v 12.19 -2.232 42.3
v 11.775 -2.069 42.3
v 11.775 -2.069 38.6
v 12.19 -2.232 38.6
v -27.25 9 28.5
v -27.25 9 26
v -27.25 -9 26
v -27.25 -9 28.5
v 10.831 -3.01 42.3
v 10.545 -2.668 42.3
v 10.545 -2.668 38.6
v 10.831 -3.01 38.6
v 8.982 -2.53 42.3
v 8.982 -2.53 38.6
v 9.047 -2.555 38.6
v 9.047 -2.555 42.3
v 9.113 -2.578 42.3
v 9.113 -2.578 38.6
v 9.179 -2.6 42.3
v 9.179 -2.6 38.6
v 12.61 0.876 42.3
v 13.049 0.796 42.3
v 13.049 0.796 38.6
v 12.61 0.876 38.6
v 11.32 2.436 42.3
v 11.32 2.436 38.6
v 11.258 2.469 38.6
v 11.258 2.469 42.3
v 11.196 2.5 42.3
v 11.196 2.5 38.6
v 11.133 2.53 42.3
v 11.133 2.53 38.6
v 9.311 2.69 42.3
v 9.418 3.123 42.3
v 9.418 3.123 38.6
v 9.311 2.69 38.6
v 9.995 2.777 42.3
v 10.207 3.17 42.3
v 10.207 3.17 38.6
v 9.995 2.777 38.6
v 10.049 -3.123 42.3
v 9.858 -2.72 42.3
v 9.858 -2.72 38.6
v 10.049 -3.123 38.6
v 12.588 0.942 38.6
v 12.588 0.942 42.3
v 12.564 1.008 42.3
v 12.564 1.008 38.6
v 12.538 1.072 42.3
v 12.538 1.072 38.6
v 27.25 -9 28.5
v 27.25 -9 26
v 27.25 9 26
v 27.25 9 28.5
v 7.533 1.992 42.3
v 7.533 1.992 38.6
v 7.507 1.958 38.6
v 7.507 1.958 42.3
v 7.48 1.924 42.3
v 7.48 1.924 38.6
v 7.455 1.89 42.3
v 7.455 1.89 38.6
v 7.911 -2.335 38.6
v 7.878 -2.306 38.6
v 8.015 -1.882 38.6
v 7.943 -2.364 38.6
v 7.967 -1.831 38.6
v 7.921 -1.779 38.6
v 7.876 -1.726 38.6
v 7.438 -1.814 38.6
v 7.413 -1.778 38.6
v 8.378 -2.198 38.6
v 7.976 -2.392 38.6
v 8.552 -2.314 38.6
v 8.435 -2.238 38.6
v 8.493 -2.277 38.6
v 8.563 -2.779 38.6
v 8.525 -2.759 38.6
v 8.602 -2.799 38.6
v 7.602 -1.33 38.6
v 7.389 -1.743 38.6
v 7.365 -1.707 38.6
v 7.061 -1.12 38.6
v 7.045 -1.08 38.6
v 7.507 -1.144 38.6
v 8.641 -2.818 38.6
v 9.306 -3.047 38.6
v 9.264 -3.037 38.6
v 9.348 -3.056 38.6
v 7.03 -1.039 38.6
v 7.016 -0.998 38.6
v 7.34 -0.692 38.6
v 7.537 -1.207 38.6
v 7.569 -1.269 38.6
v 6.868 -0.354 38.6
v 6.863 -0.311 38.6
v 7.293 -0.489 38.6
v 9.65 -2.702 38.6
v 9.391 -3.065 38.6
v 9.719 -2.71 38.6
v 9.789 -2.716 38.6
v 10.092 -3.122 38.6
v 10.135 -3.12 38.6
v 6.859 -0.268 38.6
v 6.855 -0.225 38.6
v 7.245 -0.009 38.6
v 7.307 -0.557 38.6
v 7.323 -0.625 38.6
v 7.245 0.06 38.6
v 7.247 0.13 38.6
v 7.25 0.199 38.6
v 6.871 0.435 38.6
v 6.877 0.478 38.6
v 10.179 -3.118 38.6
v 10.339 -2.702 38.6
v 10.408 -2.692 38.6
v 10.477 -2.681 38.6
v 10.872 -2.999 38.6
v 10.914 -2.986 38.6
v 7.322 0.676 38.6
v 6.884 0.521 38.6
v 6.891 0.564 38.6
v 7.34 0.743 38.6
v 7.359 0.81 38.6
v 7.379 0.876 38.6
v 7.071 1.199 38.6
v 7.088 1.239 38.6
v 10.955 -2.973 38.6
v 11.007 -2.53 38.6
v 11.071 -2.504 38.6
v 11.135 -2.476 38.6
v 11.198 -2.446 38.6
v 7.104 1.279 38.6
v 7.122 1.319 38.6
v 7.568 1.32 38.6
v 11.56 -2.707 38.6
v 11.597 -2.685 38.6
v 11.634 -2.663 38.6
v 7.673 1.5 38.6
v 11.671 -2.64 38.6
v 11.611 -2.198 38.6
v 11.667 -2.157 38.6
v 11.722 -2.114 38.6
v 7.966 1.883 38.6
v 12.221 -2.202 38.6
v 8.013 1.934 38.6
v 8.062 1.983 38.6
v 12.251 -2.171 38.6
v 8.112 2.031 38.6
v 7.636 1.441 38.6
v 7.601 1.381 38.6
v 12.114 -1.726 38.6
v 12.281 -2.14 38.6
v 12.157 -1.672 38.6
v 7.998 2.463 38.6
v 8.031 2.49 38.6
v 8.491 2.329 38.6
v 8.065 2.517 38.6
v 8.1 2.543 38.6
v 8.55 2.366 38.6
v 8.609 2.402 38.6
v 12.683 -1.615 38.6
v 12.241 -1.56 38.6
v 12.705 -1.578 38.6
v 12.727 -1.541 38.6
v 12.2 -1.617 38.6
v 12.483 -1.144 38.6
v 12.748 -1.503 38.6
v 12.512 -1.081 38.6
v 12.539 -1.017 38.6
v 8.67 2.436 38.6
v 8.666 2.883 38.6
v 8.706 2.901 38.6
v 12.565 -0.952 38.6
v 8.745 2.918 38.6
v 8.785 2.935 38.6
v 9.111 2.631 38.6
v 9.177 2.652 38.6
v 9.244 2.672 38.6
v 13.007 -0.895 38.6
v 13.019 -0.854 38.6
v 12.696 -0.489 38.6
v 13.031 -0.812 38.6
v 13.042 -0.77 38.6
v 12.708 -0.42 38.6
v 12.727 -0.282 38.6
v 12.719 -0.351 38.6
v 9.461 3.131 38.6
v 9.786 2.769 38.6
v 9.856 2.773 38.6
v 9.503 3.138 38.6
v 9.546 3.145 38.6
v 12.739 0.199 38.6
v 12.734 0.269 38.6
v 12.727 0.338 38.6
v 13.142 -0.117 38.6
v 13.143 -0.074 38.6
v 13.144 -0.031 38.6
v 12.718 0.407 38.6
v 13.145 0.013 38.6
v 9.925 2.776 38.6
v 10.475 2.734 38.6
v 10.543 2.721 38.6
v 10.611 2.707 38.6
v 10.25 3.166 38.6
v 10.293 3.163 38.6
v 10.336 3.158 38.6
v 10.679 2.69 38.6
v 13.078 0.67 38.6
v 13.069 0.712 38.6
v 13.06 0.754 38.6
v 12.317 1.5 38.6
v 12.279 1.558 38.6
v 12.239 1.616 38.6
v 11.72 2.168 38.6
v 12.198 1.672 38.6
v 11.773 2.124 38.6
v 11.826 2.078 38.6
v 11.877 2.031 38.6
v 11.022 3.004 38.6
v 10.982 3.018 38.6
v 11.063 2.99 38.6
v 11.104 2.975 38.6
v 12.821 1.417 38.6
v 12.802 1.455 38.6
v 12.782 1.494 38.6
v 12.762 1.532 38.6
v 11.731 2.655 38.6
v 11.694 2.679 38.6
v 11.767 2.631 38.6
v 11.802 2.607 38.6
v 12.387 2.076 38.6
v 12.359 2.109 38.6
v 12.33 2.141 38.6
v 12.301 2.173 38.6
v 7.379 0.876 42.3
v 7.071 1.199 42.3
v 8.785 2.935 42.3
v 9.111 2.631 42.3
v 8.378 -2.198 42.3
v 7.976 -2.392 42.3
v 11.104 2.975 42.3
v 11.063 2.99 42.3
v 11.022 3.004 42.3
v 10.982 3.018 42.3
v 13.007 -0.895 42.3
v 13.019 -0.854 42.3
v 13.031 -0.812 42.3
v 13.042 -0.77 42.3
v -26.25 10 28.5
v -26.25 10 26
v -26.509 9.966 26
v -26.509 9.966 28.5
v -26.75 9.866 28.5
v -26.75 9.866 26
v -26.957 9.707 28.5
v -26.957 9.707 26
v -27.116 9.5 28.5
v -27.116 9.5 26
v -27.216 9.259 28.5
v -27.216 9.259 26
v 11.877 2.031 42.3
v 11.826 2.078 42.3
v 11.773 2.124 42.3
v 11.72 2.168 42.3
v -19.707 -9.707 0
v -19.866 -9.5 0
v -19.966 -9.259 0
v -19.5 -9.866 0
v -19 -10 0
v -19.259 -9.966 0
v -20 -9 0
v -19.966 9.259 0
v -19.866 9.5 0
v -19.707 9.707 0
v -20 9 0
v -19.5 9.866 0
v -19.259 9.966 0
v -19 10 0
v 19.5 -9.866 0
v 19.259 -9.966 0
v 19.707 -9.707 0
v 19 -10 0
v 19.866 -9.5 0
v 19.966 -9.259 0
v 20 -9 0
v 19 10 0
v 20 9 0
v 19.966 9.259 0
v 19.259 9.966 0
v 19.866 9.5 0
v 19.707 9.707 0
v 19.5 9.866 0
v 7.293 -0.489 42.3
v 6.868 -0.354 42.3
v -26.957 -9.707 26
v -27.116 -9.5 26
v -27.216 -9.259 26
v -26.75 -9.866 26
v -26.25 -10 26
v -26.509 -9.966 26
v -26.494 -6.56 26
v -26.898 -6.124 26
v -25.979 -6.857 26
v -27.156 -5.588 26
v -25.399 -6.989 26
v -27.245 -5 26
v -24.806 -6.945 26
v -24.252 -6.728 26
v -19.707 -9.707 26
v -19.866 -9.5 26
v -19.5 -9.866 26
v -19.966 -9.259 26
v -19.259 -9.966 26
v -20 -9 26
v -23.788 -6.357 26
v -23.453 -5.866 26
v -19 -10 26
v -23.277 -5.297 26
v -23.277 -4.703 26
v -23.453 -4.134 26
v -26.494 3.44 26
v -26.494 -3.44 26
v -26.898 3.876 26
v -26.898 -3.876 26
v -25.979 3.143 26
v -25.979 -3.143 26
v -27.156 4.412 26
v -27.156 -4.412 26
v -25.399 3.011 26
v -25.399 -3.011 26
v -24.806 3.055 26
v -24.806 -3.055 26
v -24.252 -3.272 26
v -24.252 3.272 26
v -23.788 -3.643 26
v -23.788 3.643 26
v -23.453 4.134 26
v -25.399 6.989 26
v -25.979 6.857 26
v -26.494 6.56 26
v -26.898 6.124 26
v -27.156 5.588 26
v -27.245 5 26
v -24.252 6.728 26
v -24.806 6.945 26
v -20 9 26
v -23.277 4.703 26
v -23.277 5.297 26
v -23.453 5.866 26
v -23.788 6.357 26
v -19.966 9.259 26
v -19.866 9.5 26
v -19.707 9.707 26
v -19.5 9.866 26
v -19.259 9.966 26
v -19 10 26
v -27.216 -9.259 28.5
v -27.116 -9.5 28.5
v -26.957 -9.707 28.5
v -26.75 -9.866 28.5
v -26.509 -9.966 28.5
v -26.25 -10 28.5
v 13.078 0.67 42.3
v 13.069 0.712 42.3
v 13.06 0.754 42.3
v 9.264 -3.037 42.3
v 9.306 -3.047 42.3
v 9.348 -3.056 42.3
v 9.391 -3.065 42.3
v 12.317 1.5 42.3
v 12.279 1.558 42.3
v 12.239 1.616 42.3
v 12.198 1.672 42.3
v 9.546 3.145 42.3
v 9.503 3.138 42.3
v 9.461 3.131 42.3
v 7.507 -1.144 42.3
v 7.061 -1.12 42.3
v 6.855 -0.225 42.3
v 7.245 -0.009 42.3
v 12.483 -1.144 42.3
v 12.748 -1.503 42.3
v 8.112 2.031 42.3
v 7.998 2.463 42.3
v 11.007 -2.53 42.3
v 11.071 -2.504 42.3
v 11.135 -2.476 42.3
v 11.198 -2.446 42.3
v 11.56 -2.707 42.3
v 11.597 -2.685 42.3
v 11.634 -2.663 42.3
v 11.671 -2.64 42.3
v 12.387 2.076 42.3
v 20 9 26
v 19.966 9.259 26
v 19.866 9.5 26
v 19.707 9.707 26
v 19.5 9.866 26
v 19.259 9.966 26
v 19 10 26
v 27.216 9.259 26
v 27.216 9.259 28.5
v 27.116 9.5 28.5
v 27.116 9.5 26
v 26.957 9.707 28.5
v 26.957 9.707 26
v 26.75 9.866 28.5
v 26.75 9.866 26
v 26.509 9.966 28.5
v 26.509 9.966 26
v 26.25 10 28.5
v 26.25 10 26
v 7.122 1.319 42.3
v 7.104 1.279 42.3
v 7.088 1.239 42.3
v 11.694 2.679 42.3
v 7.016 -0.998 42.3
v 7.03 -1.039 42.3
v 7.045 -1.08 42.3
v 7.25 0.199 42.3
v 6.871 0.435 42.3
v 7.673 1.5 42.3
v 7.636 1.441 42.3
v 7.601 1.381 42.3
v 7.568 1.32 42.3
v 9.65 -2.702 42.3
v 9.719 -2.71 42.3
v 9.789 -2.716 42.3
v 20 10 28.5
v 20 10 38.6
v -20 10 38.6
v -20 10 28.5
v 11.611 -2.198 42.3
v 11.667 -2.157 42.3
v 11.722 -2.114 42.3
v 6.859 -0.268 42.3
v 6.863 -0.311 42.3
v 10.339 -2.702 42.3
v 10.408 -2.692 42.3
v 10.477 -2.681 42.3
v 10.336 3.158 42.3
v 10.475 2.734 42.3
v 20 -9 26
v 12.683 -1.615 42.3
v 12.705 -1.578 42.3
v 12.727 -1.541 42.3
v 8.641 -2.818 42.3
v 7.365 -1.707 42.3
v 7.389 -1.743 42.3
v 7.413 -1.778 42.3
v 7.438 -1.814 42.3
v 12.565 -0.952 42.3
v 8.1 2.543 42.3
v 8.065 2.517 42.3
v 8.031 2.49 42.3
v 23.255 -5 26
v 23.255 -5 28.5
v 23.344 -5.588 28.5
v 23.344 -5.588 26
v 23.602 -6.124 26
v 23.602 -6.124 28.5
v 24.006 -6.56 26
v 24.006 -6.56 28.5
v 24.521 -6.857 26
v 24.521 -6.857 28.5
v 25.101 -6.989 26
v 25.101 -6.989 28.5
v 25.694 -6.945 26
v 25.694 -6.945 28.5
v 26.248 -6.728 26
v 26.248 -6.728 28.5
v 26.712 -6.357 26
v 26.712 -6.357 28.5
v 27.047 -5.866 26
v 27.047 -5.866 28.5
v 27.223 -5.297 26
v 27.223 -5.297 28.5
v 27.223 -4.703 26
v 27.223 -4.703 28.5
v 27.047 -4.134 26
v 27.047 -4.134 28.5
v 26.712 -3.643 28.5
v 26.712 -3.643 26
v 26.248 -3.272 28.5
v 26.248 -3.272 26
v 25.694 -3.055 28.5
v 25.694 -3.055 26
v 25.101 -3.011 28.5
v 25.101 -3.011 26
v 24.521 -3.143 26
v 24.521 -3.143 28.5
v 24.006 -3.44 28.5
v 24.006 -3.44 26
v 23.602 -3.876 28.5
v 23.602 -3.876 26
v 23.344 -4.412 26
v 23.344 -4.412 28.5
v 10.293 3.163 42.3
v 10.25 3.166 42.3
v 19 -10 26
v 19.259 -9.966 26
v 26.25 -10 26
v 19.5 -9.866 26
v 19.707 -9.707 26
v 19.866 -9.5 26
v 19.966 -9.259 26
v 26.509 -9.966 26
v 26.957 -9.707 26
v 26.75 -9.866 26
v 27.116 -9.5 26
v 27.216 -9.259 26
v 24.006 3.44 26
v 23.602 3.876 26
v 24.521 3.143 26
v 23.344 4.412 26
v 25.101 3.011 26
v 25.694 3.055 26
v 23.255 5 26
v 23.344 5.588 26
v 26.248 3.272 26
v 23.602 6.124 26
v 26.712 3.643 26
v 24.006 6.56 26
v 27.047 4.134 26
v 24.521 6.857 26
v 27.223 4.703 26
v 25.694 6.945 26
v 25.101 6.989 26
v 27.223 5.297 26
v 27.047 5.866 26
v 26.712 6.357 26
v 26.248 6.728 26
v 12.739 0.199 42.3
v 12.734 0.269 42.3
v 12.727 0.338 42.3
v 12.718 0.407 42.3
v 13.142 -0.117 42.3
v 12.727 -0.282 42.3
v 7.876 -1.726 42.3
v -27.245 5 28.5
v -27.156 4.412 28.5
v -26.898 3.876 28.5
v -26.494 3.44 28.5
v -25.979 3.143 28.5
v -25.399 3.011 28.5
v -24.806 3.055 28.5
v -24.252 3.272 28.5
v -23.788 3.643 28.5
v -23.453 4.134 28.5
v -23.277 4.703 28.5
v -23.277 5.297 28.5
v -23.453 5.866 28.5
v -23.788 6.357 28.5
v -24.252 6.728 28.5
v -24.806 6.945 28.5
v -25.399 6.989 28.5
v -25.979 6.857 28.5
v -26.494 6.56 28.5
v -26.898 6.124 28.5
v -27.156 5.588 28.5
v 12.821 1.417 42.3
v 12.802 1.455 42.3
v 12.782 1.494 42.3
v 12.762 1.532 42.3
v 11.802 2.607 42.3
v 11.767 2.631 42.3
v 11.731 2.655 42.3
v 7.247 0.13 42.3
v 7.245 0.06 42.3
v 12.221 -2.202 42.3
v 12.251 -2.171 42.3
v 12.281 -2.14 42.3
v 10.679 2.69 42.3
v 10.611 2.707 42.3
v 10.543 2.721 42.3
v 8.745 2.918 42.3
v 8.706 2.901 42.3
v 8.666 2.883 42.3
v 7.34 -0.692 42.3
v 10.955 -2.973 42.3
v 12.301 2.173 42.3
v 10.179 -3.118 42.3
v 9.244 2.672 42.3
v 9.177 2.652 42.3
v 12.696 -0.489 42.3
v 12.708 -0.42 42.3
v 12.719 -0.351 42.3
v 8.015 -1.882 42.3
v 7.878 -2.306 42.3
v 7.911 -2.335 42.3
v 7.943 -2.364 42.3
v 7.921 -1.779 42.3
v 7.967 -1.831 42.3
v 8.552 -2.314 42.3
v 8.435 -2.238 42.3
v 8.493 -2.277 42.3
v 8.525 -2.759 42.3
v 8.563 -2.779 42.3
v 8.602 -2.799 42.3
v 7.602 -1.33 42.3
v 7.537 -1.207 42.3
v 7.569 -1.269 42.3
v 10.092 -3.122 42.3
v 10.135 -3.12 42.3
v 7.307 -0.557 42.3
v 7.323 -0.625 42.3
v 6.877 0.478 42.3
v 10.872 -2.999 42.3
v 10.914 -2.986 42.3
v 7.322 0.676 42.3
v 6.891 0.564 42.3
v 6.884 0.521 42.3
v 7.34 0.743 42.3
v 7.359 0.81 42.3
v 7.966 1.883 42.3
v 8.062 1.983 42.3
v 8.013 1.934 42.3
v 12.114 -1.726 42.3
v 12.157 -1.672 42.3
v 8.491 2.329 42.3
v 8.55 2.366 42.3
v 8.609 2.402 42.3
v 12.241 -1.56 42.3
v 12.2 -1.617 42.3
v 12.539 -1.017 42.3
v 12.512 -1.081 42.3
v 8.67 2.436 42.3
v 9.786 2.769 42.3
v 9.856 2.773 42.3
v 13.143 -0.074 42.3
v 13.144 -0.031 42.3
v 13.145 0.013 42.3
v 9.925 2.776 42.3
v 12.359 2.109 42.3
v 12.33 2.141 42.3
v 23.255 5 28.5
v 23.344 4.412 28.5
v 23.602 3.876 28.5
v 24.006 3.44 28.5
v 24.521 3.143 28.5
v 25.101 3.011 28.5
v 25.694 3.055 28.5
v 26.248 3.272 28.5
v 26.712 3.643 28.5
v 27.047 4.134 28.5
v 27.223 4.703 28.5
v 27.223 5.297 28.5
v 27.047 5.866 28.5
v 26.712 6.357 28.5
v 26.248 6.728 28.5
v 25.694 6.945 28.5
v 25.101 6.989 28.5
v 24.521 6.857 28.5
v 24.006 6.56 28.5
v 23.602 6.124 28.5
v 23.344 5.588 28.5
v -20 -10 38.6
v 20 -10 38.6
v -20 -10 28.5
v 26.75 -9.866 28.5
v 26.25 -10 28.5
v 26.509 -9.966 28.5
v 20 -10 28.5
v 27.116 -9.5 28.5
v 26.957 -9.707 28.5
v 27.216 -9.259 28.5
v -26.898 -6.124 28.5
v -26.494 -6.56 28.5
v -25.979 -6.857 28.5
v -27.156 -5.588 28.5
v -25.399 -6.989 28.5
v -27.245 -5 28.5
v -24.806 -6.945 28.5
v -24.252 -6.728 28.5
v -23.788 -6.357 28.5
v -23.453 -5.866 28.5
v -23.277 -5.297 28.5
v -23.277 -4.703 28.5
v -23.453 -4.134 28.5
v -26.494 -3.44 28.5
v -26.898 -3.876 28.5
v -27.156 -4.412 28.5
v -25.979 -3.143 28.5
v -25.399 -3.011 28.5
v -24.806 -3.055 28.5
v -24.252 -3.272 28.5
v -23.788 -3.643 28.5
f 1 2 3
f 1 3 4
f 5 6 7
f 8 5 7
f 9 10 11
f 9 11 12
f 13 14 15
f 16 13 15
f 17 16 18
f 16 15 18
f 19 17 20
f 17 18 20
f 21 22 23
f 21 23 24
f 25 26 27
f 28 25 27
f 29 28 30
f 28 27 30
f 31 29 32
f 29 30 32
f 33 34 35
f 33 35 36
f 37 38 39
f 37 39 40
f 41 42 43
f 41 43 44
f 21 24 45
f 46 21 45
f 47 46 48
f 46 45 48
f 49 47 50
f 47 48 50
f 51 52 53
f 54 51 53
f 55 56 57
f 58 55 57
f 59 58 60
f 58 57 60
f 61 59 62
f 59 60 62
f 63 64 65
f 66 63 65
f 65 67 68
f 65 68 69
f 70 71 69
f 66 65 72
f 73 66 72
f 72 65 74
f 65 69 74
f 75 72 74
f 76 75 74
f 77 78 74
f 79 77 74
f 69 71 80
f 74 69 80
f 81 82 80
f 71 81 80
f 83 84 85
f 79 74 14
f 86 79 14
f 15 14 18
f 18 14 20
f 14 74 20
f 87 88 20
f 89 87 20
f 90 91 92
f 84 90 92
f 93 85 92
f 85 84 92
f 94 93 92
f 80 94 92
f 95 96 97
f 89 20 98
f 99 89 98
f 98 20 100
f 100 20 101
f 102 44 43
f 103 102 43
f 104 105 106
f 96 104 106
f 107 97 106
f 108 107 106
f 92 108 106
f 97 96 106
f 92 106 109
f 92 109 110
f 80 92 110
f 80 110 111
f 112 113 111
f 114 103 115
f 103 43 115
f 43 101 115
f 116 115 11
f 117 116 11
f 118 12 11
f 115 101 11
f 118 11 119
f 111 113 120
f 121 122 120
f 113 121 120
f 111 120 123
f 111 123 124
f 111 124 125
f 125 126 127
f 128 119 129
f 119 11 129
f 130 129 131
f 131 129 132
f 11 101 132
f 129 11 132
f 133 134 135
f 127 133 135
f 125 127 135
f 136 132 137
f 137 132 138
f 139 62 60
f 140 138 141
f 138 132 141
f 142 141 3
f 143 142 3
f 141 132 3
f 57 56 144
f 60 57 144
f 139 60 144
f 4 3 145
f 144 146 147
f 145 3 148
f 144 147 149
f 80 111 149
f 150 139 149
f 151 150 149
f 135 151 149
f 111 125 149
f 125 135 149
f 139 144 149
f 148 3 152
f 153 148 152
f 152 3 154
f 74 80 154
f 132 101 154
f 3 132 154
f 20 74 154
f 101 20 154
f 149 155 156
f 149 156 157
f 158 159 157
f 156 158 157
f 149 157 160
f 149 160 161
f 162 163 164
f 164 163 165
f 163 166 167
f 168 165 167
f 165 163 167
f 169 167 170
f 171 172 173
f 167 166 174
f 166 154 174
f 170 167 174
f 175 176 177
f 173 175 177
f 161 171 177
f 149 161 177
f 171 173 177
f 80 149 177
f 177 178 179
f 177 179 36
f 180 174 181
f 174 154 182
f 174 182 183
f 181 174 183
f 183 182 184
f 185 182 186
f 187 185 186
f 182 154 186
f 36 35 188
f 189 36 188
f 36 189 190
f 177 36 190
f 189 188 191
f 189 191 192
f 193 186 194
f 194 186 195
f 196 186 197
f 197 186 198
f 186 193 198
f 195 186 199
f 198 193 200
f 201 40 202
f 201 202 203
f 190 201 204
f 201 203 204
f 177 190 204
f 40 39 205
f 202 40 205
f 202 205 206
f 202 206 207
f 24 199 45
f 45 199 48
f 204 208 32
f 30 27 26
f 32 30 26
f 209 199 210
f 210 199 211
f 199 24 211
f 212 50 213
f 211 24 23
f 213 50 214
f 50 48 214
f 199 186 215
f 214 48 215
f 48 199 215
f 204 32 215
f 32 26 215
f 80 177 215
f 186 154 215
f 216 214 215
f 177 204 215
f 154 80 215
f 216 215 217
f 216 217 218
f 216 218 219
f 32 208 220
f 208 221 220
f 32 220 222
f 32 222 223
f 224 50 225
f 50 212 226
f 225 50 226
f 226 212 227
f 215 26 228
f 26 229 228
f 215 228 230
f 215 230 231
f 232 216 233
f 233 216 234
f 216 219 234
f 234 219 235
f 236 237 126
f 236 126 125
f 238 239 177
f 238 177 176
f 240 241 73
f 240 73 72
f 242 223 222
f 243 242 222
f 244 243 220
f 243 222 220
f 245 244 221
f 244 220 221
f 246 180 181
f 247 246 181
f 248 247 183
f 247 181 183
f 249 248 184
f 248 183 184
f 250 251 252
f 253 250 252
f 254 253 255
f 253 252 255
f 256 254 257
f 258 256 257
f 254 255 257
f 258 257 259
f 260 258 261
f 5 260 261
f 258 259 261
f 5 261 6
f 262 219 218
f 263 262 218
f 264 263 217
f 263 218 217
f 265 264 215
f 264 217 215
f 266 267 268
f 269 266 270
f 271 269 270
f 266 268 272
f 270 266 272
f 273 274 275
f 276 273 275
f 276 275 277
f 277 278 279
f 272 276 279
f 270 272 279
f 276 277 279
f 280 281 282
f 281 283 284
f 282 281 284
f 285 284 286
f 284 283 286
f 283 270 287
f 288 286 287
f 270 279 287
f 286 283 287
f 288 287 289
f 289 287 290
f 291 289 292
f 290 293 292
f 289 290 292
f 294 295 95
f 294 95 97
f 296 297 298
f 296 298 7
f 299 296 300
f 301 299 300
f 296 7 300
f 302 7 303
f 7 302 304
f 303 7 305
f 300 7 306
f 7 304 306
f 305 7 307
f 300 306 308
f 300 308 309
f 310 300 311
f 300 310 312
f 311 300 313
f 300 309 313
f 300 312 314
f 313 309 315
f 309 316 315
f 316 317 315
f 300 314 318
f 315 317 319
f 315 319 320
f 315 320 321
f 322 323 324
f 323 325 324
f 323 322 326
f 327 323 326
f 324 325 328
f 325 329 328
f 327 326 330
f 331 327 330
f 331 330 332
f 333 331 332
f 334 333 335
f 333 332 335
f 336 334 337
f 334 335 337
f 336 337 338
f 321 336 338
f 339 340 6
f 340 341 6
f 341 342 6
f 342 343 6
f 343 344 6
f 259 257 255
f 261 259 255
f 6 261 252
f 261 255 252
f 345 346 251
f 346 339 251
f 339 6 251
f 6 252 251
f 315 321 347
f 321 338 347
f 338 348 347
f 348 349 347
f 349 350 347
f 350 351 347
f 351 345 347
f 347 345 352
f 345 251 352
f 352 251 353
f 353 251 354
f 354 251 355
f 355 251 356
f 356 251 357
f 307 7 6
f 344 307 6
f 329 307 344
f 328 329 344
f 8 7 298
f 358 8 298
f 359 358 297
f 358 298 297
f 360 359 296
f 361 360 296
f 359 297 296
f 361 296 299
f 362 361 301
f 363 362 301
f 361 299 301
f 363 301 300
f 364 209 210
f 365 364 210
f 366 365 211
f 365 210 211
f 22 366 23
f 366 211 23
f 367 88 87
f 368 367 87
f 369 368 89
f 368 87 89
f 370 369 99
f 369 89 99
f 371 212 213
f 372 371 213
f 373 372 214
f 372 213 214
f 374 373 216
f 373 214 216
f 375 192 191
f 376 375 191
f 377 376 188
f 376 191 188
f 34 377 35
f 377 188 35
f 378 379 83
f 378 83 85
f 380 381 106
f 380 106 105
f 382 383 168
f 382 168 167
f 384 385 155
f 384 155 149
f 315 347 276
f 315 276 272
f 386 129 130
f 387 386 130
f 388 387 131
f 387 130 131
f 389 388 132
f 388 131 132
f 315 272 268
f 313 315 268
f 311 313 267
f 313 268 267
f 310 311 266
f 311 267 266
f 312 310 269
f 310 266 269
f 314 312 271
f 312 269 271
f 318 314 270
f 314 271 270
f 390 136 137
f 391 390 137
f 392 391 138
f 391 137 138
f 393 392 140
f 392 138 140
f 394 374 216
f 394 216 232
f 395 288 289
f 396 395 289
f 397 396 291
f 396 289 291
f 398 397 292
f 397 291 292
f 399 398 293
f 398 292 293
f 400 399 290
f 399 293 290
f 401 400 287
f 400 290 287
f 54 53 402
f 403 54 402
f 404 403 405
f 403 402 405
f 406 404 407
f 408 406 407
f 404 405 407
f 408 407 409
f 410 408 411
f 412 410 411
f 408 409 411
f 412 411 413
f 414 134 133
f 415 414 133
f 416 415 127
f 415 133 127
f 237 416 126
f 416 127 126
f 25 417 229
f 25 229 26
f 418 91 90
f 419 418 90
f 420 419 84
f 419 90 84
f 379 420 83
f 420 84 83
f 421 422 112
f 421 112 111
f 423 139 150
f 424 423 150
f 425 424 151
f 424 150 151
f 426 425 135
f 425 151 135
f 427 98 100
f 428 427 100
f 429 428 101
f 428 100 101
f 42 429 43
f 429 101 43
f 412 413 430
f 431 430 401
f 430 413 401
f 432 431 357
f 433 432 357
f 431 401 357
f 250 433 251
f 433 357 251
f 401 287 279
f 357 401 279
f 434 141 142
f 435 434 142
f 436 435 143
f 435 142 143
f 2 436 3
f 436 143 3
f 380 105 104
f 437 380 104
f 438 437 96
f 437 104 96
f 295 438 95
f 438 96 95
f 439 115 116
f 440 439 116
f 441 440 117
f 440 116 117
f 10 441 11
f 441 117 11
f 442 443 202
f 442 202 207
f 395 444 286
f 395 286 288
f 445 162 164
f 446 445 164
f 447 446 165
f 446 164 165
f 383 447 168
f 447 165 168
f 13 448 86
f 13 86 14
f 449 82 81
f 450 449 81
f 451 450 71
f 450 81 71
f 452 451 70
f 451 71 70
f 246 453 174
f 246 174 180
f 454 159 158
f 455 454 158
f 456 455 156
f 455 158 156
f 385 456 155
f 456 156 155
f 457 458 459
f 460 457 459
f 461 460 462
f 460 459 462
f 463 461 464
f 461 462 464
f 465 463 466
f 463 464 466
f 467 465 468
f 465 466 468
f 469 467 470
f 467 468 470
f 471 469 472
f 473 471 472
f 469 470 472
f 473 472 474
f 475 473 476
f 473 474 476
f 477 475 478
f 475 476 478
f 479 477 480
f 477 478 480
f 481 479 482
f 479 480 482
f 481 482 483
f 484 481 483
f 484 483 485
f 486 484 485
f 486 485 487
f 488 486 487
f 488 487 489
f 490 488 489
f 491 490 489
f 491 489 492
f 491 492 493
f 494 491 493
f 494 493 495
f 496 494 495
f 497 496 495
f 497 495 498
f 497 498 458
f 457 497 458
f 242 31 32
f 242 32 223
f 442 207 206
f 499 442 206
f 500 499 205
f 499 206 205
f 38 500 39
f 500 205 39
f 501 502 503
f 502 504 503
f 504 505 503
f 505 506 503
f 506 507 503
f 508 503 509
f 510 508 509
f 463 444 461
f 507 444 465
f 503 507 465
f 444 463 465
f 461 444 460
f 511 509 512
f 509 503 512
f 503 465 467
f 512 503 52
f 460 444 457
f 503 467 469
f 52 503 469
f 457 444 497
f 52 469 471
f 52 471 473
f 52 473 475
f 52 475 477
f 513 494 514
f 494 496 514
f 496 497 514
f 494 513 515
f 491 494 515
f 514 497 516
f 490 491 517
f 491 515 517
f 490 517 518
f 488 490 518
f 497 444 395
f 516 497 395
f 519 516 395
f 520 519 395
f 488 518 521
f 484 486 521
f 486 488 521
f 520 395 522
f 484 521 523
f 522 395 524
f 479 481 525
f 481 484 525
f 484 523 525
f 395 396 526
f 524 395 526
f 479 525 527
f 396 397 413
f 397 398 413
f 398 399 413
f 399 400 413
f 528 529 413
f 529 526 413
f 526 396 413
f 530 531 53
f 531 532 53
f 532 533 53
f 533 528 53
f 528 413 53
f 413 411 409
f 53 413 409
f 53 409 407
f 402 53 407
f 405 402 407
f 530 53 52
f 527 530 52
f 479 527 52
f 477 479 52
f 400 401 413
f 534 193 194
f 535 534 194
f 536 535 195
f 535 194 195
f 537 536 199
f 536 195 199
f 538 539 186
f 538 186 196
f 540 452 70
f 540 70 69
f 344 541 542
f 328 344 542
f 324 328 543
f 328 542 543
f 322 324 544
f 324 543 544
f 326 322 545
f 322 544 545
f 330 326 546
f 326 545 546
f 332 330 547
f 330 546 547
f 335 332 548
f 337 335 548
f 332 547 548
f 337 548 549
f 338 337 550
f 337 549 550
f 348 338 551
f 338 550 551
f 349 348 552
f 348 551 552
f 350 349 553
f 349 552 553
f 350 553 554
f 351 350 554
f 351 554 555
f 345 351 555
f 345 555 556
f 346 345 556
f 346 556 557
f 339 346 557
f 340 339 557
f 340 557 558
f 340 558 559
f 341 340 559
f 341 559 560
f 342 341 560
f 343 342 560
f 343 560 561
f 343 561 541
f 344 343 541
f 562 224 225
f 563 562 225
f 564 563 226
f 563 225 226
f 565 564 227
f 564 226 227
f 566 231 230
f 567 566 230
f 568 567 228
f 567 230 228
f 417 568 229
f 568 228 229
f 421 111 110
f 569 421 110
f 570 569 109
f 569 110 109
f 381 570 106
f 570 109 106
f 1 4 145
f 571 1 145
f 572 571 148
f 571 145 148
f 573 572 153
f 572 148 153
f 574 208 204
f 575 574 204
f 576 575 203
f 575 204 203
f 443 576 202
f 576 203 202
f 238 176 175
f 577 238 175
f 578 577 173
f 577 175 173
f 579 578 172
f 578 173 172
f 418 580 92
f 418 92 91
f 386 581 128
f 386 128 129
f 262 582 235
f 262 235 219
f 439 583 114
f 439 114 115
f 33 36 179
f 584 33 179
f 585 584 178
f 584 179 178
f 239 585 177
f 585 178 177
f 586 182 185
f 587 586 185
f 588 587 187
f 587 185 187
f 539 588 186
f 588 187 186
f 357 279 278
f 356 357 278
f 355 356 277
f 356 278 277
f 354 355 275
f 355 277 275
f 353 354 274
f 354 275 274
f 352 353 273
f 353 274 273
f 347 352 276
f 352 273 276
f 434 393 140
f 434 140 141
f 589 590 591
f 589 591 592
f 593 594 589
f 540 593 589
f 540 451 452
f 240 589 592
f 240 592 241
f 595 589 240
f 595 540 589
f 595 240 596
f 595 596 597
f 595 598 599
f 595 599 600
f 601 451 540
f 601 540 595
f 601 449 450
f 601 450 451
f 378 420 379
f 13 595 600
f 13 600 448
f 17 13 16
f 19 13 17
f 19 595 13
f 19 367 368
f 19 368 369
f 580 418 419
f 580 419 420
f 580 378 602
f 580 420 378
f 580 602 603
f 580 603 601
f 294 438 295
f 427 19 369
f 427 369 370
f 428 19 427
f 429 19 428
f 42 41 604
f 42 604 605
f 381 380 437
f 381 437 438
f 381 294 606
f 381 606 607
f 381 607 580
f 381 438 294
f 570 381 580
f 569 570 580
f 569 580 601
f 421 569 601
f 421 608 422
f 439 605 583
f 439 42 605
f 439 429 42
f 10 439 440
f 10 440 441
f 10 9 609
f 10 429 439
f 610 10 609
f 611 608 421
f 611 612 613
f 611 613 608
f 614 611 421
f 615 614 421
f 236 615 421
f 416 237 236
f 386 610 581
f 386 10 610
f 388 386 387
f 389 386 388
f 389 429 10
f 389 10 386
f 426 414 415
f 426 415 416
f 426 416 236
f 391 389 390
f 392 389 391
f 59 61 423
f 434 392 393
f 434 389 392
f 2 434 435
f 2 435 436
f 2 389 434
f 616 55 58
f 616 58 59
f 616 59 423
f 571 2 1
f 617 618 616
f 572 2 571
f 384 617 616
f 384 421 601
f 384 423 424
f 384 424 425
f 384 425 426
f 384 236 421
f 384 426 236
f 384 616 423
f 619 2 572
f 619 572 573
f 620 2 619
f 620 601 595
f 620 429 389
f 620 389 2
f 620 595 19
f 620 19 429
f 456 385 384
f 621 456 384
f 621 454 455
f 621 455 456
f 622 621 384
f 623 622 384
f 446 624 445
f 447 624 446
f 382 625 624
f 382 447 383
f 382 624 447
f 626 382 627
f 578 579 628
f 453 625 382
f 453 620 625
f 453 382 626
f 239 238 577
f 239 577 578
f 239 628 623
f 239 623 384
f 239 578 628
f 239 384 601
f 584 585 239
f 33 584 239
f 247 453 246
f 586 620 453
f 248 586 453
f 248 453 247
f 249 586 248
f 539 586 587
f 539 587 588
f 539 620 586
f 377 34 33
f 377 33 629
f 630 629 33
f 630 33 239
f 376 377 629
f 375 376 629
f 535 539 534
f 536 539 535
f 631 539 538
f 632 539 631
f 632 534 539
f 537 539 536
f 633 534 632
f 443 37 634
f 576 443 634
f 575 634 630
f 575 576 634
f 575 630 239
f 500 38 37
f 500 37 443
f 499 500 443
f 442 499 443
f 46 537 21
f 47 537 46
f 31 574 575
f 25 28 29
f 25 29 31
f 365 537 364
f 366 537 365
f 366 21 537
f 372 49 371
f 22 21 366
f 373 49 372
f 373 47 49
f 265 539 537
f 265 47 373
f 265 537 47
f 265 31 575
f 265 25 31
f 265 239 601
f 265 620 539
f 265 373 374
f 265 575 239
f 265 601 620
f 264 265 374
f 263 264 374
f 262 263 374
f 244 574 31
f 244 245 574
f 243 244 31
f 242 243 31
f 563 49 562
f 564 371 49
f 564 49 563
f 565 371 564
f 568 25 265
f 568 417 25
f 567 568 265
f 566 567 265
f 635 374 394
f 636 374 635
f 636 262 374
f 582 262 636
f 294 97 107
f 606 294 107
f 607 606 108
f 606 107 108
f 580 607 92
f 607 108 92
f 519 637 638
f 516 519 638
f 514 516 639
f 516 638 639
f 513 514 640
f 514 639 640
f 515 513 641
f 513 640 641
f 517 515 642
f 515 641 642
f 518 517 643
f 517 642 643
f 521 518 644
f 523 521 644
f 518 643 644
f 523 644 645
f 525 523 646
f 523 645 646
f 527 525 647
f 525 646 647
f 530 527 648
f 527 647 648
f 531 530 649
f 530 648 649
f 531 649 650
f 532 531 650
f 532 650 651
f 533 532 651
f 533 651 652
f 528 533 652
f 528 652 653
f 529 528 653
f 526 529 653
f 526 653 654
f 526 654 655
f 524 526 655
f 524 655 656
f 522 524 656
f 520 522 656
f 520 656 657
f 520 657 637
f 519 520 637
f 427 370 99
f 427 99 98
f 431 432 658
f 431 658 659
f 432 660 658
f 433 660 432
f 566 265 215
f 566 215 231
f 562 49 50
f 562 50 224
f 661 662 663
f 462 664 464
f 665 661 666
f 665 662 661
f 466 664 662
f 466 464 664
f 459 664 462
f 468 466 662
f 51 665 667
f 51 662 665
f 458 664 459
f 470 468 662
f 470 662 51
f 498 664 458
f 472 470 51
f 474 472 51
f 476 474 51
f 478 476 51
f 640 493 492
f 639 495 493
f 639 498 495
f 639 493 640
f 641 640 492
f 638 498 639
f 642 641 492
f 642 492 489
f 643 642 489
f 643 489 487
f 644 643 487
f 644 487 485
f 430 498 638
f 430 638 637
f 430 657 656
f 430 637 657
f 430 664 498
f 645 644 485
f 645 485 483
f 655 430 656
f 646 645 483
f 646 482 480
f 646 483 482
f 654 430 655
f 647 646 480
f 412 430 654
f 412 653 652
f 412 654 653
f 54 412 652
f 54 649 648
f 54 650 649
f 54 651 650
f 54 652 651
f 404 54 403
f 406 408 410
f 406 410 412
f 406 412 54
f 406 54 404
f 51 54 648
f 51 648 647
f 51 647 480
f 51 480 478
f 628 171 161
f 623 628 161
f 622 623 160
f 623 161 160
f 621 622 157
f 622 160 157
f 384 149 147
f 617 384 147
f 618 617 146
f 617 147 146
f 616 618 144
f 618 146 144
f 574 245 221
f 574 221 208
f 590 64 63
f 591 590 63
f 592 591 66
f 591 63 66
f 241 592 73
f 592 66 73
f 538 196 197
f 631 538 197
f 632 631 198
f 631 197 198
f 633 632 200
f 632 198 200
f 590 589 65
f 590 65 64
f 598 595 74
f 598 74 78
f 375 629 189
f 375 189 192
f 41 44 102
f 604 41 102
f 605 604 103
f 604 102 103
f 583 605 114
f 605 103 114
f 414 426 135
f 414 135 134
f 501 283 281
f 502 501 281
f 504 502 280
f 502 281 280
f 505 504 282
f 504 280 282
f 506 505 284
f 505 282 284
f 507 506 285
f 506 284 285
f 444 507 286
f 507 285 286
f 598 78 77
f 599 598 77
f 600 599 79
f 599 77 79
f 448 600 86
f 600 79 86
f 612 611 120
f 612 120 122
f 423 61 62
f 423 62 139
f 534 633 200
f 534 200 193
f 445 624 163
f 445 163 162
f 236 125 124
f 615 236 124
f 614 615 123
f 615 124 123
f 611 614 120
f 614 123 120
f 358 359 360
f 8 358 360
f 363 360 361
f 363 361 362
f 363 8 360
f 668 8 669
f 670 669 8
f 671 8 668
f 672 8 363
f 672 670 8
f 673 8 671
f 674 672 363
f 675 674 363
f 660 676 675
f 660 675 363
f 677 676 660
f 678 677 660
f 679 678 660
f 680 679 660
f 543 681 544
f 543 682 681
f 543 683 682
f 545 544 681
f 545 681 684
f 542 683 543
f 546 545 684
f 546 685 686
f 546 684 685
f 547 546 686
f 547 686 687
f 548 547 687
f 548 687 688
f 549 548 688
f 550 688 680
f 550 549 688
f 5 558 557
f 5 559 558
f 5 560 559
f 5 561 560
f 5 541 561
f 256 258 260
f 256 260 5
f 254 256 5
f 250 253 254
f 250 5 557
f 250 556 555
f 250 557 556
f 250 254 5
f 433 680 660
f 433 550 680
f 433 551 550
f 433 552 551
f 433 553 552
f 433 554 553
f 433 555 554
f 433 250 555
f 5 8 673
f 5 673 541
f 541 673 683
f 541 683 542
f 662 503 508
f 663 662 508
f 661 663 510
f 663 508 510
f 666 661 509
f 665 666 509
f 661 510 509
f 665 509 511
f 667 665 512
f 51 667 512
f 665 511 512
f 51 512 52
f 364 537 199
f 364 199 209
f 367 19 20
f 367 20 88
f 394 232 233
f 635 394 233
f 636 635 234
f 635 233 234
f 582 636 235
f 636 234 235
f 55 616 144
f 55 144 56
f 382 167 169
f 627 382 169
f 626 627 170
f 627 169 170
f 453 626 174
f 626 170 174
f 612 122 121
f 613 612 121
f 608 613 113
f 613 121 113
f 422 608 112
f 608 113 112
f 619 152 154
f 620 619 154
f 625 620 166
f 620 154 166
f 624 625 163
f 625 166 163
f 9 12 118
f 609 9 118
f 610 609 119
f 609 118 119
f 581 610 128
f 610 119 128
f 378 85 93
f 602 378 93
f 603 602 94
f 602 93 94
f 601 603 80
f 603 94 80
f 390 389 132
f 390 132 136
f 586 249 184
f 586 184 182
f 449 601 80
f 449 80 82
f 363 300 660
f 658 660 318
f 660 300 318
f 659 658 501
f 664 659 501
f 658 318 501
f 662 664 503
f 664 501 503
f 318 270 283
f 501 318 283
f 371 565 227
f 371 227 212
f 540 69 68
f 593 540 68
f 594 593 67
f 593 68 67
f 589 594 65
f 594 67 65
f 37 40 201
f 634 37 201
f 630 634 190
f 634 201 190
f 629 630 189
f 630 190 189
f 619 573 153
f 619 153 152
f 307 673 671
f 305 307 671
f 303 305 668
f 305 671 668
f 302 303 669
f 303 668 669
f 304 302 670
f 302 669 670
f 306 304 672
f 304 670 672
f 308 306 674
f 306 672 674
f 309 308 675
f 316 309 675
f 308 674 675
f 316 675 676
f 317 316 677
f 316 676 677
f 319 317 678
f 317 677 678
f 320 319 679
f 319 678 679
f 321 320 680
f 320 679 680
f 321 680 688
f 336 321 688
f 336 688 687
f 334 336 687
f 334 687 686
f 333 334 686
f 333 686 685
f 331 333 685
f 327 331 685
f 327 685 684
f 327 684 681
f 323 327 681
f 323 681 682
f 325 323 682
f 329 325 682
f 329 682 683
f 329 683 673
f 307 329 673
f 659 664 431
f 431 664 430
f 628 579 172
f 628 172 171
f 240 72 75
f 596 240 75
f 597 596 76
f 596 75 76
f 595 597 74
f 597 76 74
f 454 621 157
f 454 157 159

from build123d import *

# Parameters (mm, degrees)
F1_DEPTH  = 26
F3_DEPTH  = 2.5
F4_D      = 3.99
F4_DEPTH  = 5
F5_W      = 40
F5_H      = 20
F6_DEPTH  = 10.1
F7_R      = 2.5
F8_DEPTH  = 6
F10_DEPTH = 2
F13_DEPTH = 3.7


with BuildPart() as f1:
    # F0 (on Top) → F1 (new body)
    with BuildSketch(Plane.XY):
        with BuildLine():
            Line((-19, -10), (19, -10))
            ThreePointArc((19, -10), (19.707107, -9.707107), (20, -9))
            Line((20, -9), (20, 9))
            ThreePointArc((20, 9), (19.707107, 9.707107), (19, 10))
            Line((19, 10), (-19, 10))
            ThreePointArc((-19, 10), (-19.707107, 9.707107), (-20, 9))
            Line((-20, 9), (-20, -9))
            ThreePointArc((-20, -9), (-19.707107, -9.707107), (-19, -10))
        make_face()
    extrude(amount=F1_DEPTH)

    # F2 (on face) → F3 (join)
    with BuildSketch(Plane.XY.offset(26)):
        with BuildLine():
            Line((-26.25, -10), (26.25, -10))
            ThreePointArc((26.25, -10), (26.957107, -9.707107), (27.25, -9))
            Line((27.25, -9), (27.25, 9))
            ThreePointArc((27.25, 9), (26.957107, 9.707107), (26.25, 10))
            Line((26.25, 10), (-26.25, 10))
            ThreePointArc((-26.25, 10), (-26.957107, 9.707107), (-27.25, 9))
            Line((-27.25, 9), (-27.25, -9))
            ThreePointArc((-27.25, -9), (-26.957107, -9.707107), (-26.25, -10))
        make_face()
    extrude(amount=F3_DEPTH)

    # F4
    with Locations(Plane(origin=(0, 0, 26), x_dir=(1, 0, 0), z_dir=(0, 0, -1))):
        with Locations((-25.25, 5), (-25.25, -5), (25.25, 5), (25.25, -5)):
            Hole(F4_D / 2, depth=F4_DEPTH)

    # F5 (on face) → F6 (join)
    with BuildSketch(Plane.XY.offset(28.5)):
        Rectangle(F5_W, F5_H)
    extrude(amount=F6_DEPTH)


with BuildPart() as f8:
    # F7 (on face) → F8 (new body)
    with BuildSketch(Plane.XY.offset(38.6)):
        with Locations((10, 0)):
            Circle(F7_R)
    extrude(amount=F8_DEPTH)

    # F9 (on face) → F10 (join)
    with BuildSketch(Plane.XY.offset(44.6)):
        with BuildLine():
            ThreePointArc((-5.588466, 1.583393), (-6.591489, 1.114912), (-7, 0.086004))
            Line((-7, 0.086004), (-7, -0.085642))
            ThreePointArc((-7, -0.085642), (-6.591358, -1.114689), (-5.588083, -1.583054))
            Line((-5.588083, -1.583054), (4.973742, -2.204338))
            ThreePointArc((4.973742, -2.204338), (6.918625, -3.07757), (7.792354, -5.02223))
            Line((7.792354, -5.02223), (8.416607, -15.588466))
            ThreePointArc((8.416607, -15.588466), (8.885088, -16.591489), (9.913996, -17))
            Line((9.913996, -17), (10.085642, -17))
            ThreePointArc((10.085642, -17), (11.114689, -16.591358), (11.583054, -15.588083))
            Line((11.583054, -15.588083), (12.204338, -5.026258))
            ThreePointArc((12.204338, -5.026258), (13.07757, -3.081375), (15.02223, -2.207646))
            Line((15.02223, -2.207646), (25.588466, -1.583393))
            ThreePointArc((25.588466, -1.583393), (26.591489, -1.114912), (27, -0.086004))
            Line((27, -0.086004), (27, 0.085642))
            ThreePointArc((27, 0.085642), (26.591358, 1.114689), (25.588083, 1.583054))
            Line((25.588083, 1.583054), (15.026258, 2.204338))
            ThreePointArc((15.026258, 2.204338), (13.081375, 3.07757), (12.207646, 5.02223))
            Line((12.207646, 5.02223), (11.583393, 15.588466))
            ThreePointArc((11.583393, 15.588466), (11.114912, 16.591489), (10.086004, 17))
            Line((10.086004, 17), (9.914358, 17))
            ThreePointArc((9.914358, 17), (8.885311, 16.591358), (8.416946, 15.588083))
            Line((8.416946, 15.588083), (7.795662, 5.026258))
            ThreePointArc((7.795662, 5.026258), (6.92243, 3.081375), (4.97777, 2.207646))
            Line((4.97777, 2.207646), (-5.588466, 1.583393))
        make_face()
    extrude(amount=F10_DEPTH)


with BuildPart() as f13:
    # F12 (on face) → F13 (new body)
    with BuildSketch(Plane.XY.offset(38.6)):
        with BuildLine():
            Line((10.206556, 3.169527), (9.994776, 2.776655))
            ThreePointArc((9.994776, 2.776655), (9.890409, 2.774673), (9.786192, 2.768733))
            Line((9.786192, 2.768733), (9.54622, 3.144554))
            ThreePointArc((9.54622, 3.144554), (9.482152, 3.134663), (9.418302, 3.123456))
            Line((9.418302, 3.123456), (9.310879, 2.690258))
            ThreePointArc((9.310879, 2.690258), (9.210283, 2.662384), (9.110818, 2.630712))
            Line((9.110818, 2.630712), (8.784922, 2.935048))
            ThreePointArc((8.784922, 2.935048), (8.725327, 2.909535), (8.66627, 2.882801))
            Line((8.66627, 2.882801), (8.669954, 2.436498))
            ThreePointArc((8.669954, 2.436498), (8.57945, 2.384482), (8.490986, 2.32907))
            Line((8.490986, 2.32907), (8.099644, 2.542797))
            ThreePointArc((8.099644, 2.542797), (8.048266, 2.503265), (7.997713, 2.462683))
            Line((7.997713, 2.462683), (8.112272, 2.031318))
            ThreePointArc((8.112272, 2.031318), (8.037547, 1.95843), (7.965643, 1.882758))
            Line((7.965643, 1.882758), (7.533443, 1.992447))
            ThreePointArc((7.533443, 1.992447), (7.493511, 1.94138), (7.454638, 1.889502))
            Line((7.454638, 1.889502), (7.672874, 1.500178))
            ThreePointArc((7.672874, 1.500178), (7.618624, 1.410996), (7.567798, 1.31982))
            Line((7.567798, 1.31982), (7.121898, 1.31858))
            ThreePointArc((7.121898, 1.31858), (7.09592, 1.259186), (7.07117, 1.19927))
            Line((7.07117, 1.19927), (7.379371, 0.876451))
            ThreePointArc((7.379371, 0.876451), (7.349004, 0.77658), (7.322449, 0.675628))
            Line((7.322449, 0.675628), (6.890866, 0.563536))
            ThreePointArc((6.890866, 0.563536), (6.880475, 0.499547), (6.871403, 0.435359))
            Line((6.871403, 0.435359), (7.250203, 0.199328))
            ThreePointArc((7.250203, 0.199328), (7.245627, 0.095043), (7.245012, -0.009342))
            Line((7.245012, -0.009342), (6.854864, -0.225243))
            ThreePointArc((6.854864, -0.225243), (6.860713, -0.289805), (6.867889, -0.354233))
            Line((6.867889, -0.354233), (7.293486, -0.488644))
            ThreePointArc((7.293486, -0.488644), (7.314989, -0.590792), (7.340353, -0.69205))
            Line((7.340353, -0.69205), (7.016155, -0.998193))
            ThreePointArc((7.016155, -0.998193), (7.037875, -1.059272), (7.060848, -1.119892))
            Line((7.060848, -1.119892), (7.506502, -1.144239))
            ThreePointArc((7.506502, -1.144239), (7.552732, -1.237829), (7.602481, -1.329598))
            Line((7.602481, -1.329598), (7.364603, -1.706749))
            ThreePointArc((7.364603, -1.706749), (7.400831, -1.760507), (7.438158, -1.813509))
            Line((7.438158, -1.813509), (7.875865, -1.726261))
            ThreePointArc((7.875865, -1.726261), (7.943918, -1.805415), (8.014926, -1.881929))
            Line((8.014926, -1.881929), (7.878314, -2.306388))
            ThreePointArc((7.878314, -2.306388), (7.926773, -2.349448), (7.976109, -2.391502))
            Line((7.976109, -2.391502), (8.378367, -2.198142))
            ThreePointArc((8.378367, -2.198142), (8.463966, -2.257885), (8.551772, -2.314336))
            Line((8.551772, -2.314336), (8.525011, -2.759434))
            ThreePointArc((8.525011, -2.759434), (8.582656, -2.78909), (8.6409, -2.817553))
            Line((8.6409, -2.817553), (8.982434, -2.530231))
            ThreePointArc((8.982434, -2.530231), (9.080201, -2.566809), (9.179287, -2.59965))
            Line((9.179287, -2.59965), (9.264058, -3.03742))
            ThreePointArc((9.264058, -3.03742), (9.327268, -3.051808), (9.39076, -3.064893))
            Line((9.39076, -3.064893), (9.65011, -2.701661))
            ThreePointArc((9.65011, -2.701661), (9.753903, -2.712776), (9.858042, -2.719944))
            Line((9.858042, -2.719944), (10.04902, -3.122878))
            ThreePointArc((10.04902, -3.122878), (10.113821, -3.121095), (10.178573, -3.117979))
            Line((10.178573, -3.117979), (10.339443, -2.701661))
            ThreePointArc((10.339443, -2.701661), (10.442739, -2.686615), (10.54539, -2.667659))
            Line((10.54539, -2.667659), (10.830572, -3.01044))
            ThreePointArc((10.830572, -3.01044), (10.892895, -2.992598), (10.954837, -2.973476))
            Line((10.954837, -2.973476), (11.007119, -2.530231))
            ThreePointArc((11.007119, -2.530231), (11.103428, -2.489969), (11.19814, -2.44608))
            Line((11.19814, -2.44608), (11.559609, -2.70717))
            ThreePointArc((11.559609, -2.70717), (11.615536, -2.674389), (11.670777, -2.640464))
            Line((11.670777, -2.640464), (11.611186, -2.198142))
            ThreePointArc((11.611186, -2.198142), (11.694456, -2.135194), (11.775278, -2.06913))
            Line((11.775278, -2.06913), (12.190322, -2.232124))
            ThreePointArc((12.190322, -2.232124), (12.236339, -2.186464), (12.281408, -2.139867))
            Line((12.281408, -2.139867), (12.113688, -1.726261))
            ThreePointArc((12.113688, -1.726261), (12.178687, -1.644582), (12.240541, -1.560495))
            Line((12.240541, -1.560495), (12.68308, -1.61515))
            ThreePointArc((12.68308, -1.61515), (12.716297, -1.559481), (12.748361, -1.50314))
            Line((12.748361, -1.50314), (12.483051, -1.144239))
            ThreePointArc((12.483051, -1.144239), (12.525696, -1.048961), (12.564694, -0.952133))
            Line((12.564694, -0.952133), (13.006922, -0.895016))
            ThreePointArc((13.006922, -0.895016), (13.025251, -0.832835), (13.042297, -0.77029))
            Line((13.042297, -0.77029), (12.696066, -0.488644))
            ThreePointArc((12.696066, -0.488644), (12.713677, -0.385754), (12.727369, -0.28227))
            Line((12.727369, -0.28227), (13.1415, -0.11697))
            ThreePointArc((13.1415, -0.11697), (13.14379, -0.052184), (13.144745, 0.012635))
            Line((13.144745, 0.012635), (12.73935, 0.199328))
            ThreePointArc((12.73935, 0.199328), (12.730819, 0.303366), (12.718346, 0.407004))
            Line((12.718346, 0.407004), (13.078358, 0.670101))
            ThreePointArc((13.078358, 0.670101), (13.064464, 0.73342), (13.049269, 0.796441))
            Line((13.049269, 0.796441), (12.610182, 0.876451))
            ThreePointArc((12.610182, 0.876451), (12.576046, 0.975098), (12.538191, 1.072379))
            Line((12.538191, 1.072379), (12.821463, 1.416741))
            ThreePointArc((12.821463, 1.416741), (12.792258, 1.474616), (12.761869, 1.531878))
            Line((12.761869, 1.531878), (12.316678, 1.500178))
            ThreePointArc((12.316678, 1.500178), (12.259082, 1.587237), (12.198224, 1.672047))
            Line((12.198224, 1.672047), (12.386957, 2.076038))
            ThreePointArc((12.386957, 2.076038), (12.344277, 2.124832), (12.300602, 2.172737))
            Line((12.300602, 2.172737), (11.877281, 2.031318))
            ThreePointArc((11.877281, 2.031318), (11.799844, 2.101318), (11.719806, 2.168329))
            Line((11.719806, 2.168329), (11.802142, 2.606564))
            ThreePointArc((11.802142, 2.606564), (11.748668, 2.64321), (11.694451, 2.678749))
            Line((11.694451, 2.678749), (11.319599, 2.436498))
            ThreePointArc((11.319599, 2.436498), (11.227187, 2.485041), (11.132998, 2.530042))
            Line((11.132998, 2.530042), (11.103763, 2.974984))
            ThreePointArc((11.103763, 2.974984), (11.042855, 2.997182), (10.981503, 3.018121))
            Line((10.981503, 3.018121), (10.678673, 2.690258))
            ThreePointArc((10.678673, 2.690258), (10.577092, 2.714294), (10.474672, 2.734458))
            Line((10.474672, 2.734458), (10.335702, 3.158151))
            ThreePointArc((10.335702, 3.158151), (10.271187, 3.164504), (10.206556, 3.169527))
        make_face()
    extrude(amount=F13_DEPTH)


solid = Compound([f1.part, f13.part])
